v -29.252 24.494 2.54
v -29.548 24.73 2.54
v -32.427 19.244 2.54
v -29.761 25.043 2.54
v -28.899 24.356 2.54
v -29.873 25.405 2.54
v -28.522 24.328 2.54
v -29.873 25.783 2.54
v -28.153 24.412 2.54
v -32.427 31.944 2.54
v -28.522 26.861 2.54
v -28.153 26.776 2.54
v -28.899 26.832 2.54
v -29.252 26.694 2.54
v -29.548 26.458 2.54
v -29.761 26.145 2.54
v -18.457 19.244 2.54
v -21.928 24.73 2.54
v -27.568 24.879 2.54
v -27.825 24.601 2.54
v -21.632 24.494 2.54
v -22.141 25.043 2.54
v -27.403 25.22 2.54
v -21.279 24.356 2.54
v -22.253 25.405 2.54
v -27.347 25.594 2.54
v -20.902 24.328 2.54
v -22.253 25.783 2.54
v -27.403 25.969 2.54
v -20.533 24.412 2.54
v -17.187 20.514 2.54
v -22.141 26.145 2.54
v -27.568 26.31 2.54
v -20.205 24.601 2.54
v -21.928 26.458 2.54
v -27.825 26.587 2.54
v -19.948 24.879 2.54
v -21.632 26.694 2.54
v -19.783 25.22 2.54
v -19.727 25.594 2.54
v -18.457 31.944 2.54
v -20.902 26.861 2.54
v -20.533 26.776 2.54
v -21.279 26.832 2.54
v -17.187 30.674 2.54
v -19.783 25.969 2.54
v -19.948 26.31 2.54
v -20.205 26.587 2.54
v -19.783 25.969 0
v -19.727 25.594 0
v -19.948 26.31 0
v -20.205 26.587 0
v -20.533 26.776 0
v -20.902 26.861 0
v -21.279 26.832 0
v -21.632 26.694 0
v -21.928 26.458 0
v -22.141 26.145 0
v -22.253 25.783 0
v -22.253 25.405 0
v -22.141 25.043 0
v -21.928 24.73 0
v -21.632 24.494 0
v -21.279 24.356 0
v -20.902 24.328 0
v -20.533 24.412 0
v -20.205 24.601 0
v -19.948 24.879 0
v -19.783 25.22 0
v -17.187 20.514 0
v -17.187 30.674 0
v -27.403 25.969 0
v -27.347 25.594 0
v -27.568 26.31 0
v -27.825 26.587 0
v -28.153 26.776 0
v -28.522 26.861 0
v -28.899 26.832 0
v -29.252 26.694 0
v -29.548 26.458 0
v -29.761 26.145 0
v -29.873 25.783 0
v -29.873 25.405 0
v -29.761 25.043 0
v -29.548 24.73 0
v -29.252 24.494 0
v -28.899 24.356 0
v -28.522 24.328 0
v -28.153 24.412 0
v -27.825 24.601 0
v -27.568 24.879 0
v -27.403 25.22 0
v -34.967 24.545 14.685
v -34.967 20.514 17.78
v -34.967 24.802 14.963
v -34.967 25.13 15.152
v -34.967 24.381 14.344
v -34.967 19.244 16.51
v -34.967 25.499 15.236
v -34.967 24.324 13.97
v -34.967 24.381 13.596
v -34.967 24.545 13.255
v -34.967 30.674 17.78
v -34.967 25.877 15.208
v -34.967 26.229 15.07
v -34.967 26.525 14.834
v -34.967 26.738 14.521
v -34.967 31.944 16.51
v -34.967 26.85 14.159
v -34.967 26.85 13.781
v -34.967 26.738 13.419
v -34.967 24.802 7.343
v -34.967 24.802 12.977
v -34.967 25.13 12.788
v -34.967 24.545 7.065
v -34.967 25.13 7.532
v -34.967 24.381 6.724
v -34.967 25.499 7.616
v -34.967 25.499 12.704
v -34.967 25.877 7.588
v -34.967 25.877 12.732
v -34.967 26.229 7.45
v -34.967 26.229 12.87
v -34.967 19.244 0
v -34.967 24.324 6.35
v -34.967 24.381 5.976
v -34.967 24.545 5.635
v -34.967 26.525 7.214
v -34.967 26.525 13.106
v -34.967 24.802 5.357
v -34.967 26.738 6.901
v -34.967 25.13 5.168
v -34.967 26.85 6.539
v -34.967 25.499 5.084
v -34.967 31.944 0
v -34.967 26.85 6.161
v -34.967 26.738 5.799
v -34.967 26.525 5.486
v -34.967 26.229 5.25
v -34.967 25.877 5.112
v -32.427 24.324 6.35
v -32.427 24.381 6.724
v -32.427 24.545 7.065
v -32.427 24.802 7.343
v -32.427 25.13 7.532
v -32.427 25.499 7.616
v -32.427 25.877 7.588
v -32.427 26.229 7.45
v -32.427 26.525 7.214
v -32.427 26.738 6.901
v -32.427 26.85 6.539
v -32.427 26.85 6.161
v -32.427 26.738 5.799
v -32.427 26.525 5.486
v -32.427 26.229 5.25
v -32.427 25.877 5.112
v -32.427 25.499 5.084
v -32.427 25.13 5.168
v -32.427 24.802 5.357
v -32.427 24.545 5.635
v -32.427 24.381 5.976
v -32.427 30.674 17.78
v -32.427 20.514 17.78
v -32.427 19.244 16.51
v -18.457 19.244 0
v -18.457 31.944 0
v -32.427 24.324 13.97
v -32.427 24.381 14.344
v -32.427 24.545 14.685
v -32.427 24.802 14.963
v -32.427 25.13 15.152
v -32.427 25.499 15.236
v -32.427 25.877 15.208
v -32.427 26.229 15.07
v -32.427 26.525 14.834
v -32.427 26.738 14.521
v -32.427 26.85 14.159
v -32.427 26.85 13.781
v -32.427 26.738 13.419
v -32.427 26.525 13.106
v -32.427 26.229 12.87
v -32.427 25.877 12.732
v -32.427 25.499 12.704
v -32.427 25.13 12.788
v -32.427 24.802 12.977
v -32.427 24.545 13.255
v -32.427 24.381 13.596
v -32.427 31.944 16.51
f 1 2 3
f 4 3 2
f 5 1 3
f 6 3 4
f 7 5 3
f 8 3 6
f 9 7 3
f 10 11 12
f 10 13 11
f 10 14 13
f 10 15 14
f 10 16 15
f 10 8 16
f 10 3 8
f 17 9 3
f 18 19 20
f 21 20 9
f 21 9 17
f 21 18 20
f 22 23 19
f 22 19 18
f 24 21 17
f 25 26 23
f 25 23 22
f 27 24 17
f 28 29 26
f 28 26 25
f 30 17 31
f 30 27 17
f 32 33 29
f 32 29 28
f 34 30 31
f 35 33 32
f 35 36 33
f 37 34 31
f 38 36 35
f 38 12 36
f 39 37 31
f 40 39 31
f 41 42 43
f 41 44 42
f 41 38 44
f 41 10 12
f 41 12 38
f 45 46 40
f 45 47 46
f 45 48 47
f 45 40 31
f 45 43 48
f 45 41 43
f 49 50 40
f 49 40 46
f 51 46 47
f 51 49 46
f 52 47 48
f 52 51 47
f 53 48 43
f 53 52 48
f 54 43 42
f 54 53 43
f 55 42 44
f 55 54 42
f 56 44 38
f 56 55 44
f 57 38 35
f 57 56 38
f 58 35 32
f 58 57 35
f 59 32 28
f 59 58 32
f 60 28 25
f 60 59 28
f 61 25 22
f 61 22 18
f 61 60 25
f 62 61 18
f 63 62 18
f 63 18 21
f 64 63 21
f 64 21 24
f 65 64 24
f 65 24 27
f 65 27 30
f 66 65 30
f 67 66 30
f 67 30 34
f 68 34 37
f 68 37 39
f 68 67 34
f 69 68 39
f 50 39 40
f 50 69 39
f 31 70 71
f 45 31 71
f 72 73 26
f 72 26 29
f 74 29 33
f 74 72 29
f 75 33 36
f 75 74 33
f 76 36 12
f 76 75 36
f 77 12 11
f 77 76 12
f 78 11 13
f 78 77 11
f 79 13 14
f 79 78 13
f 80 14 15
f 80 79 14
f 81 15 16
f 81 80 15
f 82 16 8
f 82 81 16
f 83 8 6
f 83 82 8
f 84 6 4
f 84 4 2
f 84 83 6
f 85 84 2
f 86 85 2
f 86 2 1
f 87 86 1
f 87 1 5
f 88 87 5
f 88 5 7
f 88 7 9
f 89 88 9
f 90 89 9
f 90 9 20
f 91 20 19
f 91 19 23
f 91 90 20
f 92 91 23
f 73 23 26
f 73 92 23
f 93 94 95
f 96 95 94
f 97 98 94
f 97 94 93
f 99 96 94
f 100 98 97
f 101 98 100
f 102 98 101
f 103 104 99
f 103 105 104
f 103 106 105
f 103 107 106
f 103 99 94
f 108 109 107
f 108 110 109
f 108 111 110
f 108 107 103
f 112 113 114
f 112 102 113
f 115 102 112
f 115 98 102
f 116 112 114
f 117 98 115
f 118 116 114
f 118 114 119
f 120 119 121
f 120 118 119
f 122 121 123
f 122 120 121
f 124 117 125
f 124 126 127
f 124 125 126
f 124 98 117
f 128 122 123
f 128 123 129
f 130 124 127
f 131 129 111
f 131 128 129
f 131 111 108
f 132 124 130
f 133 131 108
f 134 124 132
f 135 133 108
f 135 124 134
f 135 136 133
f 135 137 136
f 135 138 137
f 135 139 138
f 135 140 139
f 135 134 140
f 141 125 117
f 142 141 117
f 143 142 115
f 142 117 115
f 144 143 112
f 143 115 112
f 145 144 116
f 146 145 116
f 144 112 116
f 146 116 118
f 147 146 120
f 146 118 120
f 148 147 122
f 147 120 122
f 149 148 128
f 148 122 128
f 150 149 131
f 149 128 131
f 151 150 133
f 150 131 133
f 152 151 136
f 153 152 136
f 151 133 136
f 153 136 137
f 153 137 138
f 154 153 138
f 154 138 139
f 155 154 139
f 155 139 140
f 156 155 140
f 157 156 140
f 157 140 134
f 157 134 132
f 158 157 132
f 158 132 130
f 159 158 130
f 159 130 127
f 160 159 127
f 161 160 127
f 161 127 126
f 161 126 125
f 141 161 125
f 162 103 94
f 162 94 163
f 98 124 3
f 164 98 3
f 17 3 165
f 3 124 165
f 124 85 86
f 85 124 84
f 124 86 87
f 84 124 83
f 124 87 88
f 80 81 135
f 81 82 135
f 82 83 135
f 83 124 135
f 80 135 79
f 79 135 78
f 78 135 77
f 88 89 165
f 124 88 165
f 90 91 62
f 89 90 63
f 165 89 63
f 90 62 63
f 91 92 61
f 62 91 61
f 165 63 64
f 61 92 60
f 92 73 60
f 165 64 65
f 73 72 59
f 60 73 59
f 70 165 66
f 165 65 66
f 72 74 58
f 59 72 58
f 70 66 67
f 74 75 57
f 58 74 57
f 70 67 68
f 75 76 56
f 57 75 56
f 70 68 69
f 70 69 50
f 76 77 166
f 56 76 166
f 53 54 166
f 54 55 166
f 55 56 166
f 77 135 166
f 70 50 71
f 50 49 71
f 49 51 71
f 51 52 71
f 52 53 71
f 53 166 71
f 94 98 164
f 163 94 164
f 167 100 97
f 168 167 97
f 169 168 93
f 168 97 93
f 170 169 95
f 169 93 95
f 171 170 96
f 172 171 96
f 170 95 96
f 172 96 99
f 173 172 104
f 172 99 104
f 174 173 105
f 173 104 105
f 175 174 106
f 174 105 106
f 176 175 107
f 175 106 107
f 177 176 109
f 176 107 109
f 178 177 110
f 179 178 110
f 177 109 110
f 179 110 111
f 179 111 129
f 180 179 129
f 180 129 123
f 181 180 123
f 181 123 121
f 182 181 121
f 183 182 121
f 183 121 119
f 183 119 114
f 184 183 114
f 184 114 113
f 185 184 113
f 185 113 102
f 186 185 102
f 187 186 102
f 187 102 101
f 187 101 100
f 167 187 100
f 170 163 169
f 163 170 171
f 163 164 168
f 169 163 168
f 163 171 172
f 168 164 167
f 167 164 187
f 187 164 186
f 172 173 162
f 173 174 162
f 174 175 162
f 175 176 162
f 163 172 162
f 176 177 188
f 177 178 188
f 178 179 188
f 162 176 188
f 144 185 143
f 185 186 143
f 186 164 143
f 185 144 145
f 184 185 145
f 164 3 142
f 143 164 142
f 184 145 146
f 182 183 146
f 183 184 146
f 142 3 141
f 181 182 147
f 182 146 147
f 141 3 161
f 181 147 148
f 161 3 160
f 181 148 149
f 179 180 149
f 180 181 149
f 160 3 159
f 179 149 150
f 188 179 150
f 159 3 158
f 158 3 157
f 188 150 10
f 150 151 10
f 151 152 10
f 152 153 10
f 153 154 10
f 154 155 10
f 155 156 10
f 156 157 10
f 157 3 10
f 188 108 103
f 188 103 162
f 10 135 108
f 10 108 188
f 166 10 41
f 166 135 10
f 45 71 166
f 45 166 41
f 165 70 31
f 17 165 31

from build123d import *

# Parameters (mm, degrees)
F0_W     = 17.78
F0_H     = 12.7
F0_R     = 1.27
F1_DEPTH = 2.54
F2_W     = 2.54
F2_H     = 12.7
F3_DEPTH = 15.24
F4_R     = 1.27
F5_DEPTH = 25.4
F6_SIZE  = 1.27


with BuildPart() as f1:
    # F0 (on Top) → F1 (new body)
    with BuildSketch(Plane.XY):
        with Locations((-26.076857, 25.594209)):
            Rectangle(F0_W, F0_H)
        with Locations((-28.616857, 25.594209)):
            Circle(F0_R, mode=Mode.SUBTRACT)
        with Locations((-20.996857, 25.594209)):
            Circle(F0_R, mode=Mode.SUBTRACT)
    extrude(amount=F1_DEPTH)

    # F2 (on face) → F3 (join)
    with BuildSketch(Plane.XY.offset(2.54)):
        with Locations((-33.696857, 25.594209)):
            Rectangle(F2_W, F2_H)
    extrude(amount=F3_DEPTH)

    # F4 (on face) → F5 (cut)
    with BuildSketch(Plane(origin=(-34.966857, 0, 0), x_dir=(0, -1, 0), z_dir=(-1, 0, 0))):
        with Locations((-25.594209, 13.97)):
            Circle(F4_R)
        with Locations((-25.594209, 6.35)):
            Circle(F4_R)
    extrude(amount=-F5_DEPTH, mode=Mode.SUBTRACT)

    # F6
    f6_edges = [f1.edges().sort_by_distance(p)[0] for p in [
        (-33.696857, 19.244209, 17.78),
        (-33.696857, 31.944209, 17.78),
        (-17.186857, 19.244209, 1.27),
        (-17.186857, 31.944209, 1.27),
    ]]
    chamfer(f6_edges, length=F6_SIZE)


solid = f1.part
